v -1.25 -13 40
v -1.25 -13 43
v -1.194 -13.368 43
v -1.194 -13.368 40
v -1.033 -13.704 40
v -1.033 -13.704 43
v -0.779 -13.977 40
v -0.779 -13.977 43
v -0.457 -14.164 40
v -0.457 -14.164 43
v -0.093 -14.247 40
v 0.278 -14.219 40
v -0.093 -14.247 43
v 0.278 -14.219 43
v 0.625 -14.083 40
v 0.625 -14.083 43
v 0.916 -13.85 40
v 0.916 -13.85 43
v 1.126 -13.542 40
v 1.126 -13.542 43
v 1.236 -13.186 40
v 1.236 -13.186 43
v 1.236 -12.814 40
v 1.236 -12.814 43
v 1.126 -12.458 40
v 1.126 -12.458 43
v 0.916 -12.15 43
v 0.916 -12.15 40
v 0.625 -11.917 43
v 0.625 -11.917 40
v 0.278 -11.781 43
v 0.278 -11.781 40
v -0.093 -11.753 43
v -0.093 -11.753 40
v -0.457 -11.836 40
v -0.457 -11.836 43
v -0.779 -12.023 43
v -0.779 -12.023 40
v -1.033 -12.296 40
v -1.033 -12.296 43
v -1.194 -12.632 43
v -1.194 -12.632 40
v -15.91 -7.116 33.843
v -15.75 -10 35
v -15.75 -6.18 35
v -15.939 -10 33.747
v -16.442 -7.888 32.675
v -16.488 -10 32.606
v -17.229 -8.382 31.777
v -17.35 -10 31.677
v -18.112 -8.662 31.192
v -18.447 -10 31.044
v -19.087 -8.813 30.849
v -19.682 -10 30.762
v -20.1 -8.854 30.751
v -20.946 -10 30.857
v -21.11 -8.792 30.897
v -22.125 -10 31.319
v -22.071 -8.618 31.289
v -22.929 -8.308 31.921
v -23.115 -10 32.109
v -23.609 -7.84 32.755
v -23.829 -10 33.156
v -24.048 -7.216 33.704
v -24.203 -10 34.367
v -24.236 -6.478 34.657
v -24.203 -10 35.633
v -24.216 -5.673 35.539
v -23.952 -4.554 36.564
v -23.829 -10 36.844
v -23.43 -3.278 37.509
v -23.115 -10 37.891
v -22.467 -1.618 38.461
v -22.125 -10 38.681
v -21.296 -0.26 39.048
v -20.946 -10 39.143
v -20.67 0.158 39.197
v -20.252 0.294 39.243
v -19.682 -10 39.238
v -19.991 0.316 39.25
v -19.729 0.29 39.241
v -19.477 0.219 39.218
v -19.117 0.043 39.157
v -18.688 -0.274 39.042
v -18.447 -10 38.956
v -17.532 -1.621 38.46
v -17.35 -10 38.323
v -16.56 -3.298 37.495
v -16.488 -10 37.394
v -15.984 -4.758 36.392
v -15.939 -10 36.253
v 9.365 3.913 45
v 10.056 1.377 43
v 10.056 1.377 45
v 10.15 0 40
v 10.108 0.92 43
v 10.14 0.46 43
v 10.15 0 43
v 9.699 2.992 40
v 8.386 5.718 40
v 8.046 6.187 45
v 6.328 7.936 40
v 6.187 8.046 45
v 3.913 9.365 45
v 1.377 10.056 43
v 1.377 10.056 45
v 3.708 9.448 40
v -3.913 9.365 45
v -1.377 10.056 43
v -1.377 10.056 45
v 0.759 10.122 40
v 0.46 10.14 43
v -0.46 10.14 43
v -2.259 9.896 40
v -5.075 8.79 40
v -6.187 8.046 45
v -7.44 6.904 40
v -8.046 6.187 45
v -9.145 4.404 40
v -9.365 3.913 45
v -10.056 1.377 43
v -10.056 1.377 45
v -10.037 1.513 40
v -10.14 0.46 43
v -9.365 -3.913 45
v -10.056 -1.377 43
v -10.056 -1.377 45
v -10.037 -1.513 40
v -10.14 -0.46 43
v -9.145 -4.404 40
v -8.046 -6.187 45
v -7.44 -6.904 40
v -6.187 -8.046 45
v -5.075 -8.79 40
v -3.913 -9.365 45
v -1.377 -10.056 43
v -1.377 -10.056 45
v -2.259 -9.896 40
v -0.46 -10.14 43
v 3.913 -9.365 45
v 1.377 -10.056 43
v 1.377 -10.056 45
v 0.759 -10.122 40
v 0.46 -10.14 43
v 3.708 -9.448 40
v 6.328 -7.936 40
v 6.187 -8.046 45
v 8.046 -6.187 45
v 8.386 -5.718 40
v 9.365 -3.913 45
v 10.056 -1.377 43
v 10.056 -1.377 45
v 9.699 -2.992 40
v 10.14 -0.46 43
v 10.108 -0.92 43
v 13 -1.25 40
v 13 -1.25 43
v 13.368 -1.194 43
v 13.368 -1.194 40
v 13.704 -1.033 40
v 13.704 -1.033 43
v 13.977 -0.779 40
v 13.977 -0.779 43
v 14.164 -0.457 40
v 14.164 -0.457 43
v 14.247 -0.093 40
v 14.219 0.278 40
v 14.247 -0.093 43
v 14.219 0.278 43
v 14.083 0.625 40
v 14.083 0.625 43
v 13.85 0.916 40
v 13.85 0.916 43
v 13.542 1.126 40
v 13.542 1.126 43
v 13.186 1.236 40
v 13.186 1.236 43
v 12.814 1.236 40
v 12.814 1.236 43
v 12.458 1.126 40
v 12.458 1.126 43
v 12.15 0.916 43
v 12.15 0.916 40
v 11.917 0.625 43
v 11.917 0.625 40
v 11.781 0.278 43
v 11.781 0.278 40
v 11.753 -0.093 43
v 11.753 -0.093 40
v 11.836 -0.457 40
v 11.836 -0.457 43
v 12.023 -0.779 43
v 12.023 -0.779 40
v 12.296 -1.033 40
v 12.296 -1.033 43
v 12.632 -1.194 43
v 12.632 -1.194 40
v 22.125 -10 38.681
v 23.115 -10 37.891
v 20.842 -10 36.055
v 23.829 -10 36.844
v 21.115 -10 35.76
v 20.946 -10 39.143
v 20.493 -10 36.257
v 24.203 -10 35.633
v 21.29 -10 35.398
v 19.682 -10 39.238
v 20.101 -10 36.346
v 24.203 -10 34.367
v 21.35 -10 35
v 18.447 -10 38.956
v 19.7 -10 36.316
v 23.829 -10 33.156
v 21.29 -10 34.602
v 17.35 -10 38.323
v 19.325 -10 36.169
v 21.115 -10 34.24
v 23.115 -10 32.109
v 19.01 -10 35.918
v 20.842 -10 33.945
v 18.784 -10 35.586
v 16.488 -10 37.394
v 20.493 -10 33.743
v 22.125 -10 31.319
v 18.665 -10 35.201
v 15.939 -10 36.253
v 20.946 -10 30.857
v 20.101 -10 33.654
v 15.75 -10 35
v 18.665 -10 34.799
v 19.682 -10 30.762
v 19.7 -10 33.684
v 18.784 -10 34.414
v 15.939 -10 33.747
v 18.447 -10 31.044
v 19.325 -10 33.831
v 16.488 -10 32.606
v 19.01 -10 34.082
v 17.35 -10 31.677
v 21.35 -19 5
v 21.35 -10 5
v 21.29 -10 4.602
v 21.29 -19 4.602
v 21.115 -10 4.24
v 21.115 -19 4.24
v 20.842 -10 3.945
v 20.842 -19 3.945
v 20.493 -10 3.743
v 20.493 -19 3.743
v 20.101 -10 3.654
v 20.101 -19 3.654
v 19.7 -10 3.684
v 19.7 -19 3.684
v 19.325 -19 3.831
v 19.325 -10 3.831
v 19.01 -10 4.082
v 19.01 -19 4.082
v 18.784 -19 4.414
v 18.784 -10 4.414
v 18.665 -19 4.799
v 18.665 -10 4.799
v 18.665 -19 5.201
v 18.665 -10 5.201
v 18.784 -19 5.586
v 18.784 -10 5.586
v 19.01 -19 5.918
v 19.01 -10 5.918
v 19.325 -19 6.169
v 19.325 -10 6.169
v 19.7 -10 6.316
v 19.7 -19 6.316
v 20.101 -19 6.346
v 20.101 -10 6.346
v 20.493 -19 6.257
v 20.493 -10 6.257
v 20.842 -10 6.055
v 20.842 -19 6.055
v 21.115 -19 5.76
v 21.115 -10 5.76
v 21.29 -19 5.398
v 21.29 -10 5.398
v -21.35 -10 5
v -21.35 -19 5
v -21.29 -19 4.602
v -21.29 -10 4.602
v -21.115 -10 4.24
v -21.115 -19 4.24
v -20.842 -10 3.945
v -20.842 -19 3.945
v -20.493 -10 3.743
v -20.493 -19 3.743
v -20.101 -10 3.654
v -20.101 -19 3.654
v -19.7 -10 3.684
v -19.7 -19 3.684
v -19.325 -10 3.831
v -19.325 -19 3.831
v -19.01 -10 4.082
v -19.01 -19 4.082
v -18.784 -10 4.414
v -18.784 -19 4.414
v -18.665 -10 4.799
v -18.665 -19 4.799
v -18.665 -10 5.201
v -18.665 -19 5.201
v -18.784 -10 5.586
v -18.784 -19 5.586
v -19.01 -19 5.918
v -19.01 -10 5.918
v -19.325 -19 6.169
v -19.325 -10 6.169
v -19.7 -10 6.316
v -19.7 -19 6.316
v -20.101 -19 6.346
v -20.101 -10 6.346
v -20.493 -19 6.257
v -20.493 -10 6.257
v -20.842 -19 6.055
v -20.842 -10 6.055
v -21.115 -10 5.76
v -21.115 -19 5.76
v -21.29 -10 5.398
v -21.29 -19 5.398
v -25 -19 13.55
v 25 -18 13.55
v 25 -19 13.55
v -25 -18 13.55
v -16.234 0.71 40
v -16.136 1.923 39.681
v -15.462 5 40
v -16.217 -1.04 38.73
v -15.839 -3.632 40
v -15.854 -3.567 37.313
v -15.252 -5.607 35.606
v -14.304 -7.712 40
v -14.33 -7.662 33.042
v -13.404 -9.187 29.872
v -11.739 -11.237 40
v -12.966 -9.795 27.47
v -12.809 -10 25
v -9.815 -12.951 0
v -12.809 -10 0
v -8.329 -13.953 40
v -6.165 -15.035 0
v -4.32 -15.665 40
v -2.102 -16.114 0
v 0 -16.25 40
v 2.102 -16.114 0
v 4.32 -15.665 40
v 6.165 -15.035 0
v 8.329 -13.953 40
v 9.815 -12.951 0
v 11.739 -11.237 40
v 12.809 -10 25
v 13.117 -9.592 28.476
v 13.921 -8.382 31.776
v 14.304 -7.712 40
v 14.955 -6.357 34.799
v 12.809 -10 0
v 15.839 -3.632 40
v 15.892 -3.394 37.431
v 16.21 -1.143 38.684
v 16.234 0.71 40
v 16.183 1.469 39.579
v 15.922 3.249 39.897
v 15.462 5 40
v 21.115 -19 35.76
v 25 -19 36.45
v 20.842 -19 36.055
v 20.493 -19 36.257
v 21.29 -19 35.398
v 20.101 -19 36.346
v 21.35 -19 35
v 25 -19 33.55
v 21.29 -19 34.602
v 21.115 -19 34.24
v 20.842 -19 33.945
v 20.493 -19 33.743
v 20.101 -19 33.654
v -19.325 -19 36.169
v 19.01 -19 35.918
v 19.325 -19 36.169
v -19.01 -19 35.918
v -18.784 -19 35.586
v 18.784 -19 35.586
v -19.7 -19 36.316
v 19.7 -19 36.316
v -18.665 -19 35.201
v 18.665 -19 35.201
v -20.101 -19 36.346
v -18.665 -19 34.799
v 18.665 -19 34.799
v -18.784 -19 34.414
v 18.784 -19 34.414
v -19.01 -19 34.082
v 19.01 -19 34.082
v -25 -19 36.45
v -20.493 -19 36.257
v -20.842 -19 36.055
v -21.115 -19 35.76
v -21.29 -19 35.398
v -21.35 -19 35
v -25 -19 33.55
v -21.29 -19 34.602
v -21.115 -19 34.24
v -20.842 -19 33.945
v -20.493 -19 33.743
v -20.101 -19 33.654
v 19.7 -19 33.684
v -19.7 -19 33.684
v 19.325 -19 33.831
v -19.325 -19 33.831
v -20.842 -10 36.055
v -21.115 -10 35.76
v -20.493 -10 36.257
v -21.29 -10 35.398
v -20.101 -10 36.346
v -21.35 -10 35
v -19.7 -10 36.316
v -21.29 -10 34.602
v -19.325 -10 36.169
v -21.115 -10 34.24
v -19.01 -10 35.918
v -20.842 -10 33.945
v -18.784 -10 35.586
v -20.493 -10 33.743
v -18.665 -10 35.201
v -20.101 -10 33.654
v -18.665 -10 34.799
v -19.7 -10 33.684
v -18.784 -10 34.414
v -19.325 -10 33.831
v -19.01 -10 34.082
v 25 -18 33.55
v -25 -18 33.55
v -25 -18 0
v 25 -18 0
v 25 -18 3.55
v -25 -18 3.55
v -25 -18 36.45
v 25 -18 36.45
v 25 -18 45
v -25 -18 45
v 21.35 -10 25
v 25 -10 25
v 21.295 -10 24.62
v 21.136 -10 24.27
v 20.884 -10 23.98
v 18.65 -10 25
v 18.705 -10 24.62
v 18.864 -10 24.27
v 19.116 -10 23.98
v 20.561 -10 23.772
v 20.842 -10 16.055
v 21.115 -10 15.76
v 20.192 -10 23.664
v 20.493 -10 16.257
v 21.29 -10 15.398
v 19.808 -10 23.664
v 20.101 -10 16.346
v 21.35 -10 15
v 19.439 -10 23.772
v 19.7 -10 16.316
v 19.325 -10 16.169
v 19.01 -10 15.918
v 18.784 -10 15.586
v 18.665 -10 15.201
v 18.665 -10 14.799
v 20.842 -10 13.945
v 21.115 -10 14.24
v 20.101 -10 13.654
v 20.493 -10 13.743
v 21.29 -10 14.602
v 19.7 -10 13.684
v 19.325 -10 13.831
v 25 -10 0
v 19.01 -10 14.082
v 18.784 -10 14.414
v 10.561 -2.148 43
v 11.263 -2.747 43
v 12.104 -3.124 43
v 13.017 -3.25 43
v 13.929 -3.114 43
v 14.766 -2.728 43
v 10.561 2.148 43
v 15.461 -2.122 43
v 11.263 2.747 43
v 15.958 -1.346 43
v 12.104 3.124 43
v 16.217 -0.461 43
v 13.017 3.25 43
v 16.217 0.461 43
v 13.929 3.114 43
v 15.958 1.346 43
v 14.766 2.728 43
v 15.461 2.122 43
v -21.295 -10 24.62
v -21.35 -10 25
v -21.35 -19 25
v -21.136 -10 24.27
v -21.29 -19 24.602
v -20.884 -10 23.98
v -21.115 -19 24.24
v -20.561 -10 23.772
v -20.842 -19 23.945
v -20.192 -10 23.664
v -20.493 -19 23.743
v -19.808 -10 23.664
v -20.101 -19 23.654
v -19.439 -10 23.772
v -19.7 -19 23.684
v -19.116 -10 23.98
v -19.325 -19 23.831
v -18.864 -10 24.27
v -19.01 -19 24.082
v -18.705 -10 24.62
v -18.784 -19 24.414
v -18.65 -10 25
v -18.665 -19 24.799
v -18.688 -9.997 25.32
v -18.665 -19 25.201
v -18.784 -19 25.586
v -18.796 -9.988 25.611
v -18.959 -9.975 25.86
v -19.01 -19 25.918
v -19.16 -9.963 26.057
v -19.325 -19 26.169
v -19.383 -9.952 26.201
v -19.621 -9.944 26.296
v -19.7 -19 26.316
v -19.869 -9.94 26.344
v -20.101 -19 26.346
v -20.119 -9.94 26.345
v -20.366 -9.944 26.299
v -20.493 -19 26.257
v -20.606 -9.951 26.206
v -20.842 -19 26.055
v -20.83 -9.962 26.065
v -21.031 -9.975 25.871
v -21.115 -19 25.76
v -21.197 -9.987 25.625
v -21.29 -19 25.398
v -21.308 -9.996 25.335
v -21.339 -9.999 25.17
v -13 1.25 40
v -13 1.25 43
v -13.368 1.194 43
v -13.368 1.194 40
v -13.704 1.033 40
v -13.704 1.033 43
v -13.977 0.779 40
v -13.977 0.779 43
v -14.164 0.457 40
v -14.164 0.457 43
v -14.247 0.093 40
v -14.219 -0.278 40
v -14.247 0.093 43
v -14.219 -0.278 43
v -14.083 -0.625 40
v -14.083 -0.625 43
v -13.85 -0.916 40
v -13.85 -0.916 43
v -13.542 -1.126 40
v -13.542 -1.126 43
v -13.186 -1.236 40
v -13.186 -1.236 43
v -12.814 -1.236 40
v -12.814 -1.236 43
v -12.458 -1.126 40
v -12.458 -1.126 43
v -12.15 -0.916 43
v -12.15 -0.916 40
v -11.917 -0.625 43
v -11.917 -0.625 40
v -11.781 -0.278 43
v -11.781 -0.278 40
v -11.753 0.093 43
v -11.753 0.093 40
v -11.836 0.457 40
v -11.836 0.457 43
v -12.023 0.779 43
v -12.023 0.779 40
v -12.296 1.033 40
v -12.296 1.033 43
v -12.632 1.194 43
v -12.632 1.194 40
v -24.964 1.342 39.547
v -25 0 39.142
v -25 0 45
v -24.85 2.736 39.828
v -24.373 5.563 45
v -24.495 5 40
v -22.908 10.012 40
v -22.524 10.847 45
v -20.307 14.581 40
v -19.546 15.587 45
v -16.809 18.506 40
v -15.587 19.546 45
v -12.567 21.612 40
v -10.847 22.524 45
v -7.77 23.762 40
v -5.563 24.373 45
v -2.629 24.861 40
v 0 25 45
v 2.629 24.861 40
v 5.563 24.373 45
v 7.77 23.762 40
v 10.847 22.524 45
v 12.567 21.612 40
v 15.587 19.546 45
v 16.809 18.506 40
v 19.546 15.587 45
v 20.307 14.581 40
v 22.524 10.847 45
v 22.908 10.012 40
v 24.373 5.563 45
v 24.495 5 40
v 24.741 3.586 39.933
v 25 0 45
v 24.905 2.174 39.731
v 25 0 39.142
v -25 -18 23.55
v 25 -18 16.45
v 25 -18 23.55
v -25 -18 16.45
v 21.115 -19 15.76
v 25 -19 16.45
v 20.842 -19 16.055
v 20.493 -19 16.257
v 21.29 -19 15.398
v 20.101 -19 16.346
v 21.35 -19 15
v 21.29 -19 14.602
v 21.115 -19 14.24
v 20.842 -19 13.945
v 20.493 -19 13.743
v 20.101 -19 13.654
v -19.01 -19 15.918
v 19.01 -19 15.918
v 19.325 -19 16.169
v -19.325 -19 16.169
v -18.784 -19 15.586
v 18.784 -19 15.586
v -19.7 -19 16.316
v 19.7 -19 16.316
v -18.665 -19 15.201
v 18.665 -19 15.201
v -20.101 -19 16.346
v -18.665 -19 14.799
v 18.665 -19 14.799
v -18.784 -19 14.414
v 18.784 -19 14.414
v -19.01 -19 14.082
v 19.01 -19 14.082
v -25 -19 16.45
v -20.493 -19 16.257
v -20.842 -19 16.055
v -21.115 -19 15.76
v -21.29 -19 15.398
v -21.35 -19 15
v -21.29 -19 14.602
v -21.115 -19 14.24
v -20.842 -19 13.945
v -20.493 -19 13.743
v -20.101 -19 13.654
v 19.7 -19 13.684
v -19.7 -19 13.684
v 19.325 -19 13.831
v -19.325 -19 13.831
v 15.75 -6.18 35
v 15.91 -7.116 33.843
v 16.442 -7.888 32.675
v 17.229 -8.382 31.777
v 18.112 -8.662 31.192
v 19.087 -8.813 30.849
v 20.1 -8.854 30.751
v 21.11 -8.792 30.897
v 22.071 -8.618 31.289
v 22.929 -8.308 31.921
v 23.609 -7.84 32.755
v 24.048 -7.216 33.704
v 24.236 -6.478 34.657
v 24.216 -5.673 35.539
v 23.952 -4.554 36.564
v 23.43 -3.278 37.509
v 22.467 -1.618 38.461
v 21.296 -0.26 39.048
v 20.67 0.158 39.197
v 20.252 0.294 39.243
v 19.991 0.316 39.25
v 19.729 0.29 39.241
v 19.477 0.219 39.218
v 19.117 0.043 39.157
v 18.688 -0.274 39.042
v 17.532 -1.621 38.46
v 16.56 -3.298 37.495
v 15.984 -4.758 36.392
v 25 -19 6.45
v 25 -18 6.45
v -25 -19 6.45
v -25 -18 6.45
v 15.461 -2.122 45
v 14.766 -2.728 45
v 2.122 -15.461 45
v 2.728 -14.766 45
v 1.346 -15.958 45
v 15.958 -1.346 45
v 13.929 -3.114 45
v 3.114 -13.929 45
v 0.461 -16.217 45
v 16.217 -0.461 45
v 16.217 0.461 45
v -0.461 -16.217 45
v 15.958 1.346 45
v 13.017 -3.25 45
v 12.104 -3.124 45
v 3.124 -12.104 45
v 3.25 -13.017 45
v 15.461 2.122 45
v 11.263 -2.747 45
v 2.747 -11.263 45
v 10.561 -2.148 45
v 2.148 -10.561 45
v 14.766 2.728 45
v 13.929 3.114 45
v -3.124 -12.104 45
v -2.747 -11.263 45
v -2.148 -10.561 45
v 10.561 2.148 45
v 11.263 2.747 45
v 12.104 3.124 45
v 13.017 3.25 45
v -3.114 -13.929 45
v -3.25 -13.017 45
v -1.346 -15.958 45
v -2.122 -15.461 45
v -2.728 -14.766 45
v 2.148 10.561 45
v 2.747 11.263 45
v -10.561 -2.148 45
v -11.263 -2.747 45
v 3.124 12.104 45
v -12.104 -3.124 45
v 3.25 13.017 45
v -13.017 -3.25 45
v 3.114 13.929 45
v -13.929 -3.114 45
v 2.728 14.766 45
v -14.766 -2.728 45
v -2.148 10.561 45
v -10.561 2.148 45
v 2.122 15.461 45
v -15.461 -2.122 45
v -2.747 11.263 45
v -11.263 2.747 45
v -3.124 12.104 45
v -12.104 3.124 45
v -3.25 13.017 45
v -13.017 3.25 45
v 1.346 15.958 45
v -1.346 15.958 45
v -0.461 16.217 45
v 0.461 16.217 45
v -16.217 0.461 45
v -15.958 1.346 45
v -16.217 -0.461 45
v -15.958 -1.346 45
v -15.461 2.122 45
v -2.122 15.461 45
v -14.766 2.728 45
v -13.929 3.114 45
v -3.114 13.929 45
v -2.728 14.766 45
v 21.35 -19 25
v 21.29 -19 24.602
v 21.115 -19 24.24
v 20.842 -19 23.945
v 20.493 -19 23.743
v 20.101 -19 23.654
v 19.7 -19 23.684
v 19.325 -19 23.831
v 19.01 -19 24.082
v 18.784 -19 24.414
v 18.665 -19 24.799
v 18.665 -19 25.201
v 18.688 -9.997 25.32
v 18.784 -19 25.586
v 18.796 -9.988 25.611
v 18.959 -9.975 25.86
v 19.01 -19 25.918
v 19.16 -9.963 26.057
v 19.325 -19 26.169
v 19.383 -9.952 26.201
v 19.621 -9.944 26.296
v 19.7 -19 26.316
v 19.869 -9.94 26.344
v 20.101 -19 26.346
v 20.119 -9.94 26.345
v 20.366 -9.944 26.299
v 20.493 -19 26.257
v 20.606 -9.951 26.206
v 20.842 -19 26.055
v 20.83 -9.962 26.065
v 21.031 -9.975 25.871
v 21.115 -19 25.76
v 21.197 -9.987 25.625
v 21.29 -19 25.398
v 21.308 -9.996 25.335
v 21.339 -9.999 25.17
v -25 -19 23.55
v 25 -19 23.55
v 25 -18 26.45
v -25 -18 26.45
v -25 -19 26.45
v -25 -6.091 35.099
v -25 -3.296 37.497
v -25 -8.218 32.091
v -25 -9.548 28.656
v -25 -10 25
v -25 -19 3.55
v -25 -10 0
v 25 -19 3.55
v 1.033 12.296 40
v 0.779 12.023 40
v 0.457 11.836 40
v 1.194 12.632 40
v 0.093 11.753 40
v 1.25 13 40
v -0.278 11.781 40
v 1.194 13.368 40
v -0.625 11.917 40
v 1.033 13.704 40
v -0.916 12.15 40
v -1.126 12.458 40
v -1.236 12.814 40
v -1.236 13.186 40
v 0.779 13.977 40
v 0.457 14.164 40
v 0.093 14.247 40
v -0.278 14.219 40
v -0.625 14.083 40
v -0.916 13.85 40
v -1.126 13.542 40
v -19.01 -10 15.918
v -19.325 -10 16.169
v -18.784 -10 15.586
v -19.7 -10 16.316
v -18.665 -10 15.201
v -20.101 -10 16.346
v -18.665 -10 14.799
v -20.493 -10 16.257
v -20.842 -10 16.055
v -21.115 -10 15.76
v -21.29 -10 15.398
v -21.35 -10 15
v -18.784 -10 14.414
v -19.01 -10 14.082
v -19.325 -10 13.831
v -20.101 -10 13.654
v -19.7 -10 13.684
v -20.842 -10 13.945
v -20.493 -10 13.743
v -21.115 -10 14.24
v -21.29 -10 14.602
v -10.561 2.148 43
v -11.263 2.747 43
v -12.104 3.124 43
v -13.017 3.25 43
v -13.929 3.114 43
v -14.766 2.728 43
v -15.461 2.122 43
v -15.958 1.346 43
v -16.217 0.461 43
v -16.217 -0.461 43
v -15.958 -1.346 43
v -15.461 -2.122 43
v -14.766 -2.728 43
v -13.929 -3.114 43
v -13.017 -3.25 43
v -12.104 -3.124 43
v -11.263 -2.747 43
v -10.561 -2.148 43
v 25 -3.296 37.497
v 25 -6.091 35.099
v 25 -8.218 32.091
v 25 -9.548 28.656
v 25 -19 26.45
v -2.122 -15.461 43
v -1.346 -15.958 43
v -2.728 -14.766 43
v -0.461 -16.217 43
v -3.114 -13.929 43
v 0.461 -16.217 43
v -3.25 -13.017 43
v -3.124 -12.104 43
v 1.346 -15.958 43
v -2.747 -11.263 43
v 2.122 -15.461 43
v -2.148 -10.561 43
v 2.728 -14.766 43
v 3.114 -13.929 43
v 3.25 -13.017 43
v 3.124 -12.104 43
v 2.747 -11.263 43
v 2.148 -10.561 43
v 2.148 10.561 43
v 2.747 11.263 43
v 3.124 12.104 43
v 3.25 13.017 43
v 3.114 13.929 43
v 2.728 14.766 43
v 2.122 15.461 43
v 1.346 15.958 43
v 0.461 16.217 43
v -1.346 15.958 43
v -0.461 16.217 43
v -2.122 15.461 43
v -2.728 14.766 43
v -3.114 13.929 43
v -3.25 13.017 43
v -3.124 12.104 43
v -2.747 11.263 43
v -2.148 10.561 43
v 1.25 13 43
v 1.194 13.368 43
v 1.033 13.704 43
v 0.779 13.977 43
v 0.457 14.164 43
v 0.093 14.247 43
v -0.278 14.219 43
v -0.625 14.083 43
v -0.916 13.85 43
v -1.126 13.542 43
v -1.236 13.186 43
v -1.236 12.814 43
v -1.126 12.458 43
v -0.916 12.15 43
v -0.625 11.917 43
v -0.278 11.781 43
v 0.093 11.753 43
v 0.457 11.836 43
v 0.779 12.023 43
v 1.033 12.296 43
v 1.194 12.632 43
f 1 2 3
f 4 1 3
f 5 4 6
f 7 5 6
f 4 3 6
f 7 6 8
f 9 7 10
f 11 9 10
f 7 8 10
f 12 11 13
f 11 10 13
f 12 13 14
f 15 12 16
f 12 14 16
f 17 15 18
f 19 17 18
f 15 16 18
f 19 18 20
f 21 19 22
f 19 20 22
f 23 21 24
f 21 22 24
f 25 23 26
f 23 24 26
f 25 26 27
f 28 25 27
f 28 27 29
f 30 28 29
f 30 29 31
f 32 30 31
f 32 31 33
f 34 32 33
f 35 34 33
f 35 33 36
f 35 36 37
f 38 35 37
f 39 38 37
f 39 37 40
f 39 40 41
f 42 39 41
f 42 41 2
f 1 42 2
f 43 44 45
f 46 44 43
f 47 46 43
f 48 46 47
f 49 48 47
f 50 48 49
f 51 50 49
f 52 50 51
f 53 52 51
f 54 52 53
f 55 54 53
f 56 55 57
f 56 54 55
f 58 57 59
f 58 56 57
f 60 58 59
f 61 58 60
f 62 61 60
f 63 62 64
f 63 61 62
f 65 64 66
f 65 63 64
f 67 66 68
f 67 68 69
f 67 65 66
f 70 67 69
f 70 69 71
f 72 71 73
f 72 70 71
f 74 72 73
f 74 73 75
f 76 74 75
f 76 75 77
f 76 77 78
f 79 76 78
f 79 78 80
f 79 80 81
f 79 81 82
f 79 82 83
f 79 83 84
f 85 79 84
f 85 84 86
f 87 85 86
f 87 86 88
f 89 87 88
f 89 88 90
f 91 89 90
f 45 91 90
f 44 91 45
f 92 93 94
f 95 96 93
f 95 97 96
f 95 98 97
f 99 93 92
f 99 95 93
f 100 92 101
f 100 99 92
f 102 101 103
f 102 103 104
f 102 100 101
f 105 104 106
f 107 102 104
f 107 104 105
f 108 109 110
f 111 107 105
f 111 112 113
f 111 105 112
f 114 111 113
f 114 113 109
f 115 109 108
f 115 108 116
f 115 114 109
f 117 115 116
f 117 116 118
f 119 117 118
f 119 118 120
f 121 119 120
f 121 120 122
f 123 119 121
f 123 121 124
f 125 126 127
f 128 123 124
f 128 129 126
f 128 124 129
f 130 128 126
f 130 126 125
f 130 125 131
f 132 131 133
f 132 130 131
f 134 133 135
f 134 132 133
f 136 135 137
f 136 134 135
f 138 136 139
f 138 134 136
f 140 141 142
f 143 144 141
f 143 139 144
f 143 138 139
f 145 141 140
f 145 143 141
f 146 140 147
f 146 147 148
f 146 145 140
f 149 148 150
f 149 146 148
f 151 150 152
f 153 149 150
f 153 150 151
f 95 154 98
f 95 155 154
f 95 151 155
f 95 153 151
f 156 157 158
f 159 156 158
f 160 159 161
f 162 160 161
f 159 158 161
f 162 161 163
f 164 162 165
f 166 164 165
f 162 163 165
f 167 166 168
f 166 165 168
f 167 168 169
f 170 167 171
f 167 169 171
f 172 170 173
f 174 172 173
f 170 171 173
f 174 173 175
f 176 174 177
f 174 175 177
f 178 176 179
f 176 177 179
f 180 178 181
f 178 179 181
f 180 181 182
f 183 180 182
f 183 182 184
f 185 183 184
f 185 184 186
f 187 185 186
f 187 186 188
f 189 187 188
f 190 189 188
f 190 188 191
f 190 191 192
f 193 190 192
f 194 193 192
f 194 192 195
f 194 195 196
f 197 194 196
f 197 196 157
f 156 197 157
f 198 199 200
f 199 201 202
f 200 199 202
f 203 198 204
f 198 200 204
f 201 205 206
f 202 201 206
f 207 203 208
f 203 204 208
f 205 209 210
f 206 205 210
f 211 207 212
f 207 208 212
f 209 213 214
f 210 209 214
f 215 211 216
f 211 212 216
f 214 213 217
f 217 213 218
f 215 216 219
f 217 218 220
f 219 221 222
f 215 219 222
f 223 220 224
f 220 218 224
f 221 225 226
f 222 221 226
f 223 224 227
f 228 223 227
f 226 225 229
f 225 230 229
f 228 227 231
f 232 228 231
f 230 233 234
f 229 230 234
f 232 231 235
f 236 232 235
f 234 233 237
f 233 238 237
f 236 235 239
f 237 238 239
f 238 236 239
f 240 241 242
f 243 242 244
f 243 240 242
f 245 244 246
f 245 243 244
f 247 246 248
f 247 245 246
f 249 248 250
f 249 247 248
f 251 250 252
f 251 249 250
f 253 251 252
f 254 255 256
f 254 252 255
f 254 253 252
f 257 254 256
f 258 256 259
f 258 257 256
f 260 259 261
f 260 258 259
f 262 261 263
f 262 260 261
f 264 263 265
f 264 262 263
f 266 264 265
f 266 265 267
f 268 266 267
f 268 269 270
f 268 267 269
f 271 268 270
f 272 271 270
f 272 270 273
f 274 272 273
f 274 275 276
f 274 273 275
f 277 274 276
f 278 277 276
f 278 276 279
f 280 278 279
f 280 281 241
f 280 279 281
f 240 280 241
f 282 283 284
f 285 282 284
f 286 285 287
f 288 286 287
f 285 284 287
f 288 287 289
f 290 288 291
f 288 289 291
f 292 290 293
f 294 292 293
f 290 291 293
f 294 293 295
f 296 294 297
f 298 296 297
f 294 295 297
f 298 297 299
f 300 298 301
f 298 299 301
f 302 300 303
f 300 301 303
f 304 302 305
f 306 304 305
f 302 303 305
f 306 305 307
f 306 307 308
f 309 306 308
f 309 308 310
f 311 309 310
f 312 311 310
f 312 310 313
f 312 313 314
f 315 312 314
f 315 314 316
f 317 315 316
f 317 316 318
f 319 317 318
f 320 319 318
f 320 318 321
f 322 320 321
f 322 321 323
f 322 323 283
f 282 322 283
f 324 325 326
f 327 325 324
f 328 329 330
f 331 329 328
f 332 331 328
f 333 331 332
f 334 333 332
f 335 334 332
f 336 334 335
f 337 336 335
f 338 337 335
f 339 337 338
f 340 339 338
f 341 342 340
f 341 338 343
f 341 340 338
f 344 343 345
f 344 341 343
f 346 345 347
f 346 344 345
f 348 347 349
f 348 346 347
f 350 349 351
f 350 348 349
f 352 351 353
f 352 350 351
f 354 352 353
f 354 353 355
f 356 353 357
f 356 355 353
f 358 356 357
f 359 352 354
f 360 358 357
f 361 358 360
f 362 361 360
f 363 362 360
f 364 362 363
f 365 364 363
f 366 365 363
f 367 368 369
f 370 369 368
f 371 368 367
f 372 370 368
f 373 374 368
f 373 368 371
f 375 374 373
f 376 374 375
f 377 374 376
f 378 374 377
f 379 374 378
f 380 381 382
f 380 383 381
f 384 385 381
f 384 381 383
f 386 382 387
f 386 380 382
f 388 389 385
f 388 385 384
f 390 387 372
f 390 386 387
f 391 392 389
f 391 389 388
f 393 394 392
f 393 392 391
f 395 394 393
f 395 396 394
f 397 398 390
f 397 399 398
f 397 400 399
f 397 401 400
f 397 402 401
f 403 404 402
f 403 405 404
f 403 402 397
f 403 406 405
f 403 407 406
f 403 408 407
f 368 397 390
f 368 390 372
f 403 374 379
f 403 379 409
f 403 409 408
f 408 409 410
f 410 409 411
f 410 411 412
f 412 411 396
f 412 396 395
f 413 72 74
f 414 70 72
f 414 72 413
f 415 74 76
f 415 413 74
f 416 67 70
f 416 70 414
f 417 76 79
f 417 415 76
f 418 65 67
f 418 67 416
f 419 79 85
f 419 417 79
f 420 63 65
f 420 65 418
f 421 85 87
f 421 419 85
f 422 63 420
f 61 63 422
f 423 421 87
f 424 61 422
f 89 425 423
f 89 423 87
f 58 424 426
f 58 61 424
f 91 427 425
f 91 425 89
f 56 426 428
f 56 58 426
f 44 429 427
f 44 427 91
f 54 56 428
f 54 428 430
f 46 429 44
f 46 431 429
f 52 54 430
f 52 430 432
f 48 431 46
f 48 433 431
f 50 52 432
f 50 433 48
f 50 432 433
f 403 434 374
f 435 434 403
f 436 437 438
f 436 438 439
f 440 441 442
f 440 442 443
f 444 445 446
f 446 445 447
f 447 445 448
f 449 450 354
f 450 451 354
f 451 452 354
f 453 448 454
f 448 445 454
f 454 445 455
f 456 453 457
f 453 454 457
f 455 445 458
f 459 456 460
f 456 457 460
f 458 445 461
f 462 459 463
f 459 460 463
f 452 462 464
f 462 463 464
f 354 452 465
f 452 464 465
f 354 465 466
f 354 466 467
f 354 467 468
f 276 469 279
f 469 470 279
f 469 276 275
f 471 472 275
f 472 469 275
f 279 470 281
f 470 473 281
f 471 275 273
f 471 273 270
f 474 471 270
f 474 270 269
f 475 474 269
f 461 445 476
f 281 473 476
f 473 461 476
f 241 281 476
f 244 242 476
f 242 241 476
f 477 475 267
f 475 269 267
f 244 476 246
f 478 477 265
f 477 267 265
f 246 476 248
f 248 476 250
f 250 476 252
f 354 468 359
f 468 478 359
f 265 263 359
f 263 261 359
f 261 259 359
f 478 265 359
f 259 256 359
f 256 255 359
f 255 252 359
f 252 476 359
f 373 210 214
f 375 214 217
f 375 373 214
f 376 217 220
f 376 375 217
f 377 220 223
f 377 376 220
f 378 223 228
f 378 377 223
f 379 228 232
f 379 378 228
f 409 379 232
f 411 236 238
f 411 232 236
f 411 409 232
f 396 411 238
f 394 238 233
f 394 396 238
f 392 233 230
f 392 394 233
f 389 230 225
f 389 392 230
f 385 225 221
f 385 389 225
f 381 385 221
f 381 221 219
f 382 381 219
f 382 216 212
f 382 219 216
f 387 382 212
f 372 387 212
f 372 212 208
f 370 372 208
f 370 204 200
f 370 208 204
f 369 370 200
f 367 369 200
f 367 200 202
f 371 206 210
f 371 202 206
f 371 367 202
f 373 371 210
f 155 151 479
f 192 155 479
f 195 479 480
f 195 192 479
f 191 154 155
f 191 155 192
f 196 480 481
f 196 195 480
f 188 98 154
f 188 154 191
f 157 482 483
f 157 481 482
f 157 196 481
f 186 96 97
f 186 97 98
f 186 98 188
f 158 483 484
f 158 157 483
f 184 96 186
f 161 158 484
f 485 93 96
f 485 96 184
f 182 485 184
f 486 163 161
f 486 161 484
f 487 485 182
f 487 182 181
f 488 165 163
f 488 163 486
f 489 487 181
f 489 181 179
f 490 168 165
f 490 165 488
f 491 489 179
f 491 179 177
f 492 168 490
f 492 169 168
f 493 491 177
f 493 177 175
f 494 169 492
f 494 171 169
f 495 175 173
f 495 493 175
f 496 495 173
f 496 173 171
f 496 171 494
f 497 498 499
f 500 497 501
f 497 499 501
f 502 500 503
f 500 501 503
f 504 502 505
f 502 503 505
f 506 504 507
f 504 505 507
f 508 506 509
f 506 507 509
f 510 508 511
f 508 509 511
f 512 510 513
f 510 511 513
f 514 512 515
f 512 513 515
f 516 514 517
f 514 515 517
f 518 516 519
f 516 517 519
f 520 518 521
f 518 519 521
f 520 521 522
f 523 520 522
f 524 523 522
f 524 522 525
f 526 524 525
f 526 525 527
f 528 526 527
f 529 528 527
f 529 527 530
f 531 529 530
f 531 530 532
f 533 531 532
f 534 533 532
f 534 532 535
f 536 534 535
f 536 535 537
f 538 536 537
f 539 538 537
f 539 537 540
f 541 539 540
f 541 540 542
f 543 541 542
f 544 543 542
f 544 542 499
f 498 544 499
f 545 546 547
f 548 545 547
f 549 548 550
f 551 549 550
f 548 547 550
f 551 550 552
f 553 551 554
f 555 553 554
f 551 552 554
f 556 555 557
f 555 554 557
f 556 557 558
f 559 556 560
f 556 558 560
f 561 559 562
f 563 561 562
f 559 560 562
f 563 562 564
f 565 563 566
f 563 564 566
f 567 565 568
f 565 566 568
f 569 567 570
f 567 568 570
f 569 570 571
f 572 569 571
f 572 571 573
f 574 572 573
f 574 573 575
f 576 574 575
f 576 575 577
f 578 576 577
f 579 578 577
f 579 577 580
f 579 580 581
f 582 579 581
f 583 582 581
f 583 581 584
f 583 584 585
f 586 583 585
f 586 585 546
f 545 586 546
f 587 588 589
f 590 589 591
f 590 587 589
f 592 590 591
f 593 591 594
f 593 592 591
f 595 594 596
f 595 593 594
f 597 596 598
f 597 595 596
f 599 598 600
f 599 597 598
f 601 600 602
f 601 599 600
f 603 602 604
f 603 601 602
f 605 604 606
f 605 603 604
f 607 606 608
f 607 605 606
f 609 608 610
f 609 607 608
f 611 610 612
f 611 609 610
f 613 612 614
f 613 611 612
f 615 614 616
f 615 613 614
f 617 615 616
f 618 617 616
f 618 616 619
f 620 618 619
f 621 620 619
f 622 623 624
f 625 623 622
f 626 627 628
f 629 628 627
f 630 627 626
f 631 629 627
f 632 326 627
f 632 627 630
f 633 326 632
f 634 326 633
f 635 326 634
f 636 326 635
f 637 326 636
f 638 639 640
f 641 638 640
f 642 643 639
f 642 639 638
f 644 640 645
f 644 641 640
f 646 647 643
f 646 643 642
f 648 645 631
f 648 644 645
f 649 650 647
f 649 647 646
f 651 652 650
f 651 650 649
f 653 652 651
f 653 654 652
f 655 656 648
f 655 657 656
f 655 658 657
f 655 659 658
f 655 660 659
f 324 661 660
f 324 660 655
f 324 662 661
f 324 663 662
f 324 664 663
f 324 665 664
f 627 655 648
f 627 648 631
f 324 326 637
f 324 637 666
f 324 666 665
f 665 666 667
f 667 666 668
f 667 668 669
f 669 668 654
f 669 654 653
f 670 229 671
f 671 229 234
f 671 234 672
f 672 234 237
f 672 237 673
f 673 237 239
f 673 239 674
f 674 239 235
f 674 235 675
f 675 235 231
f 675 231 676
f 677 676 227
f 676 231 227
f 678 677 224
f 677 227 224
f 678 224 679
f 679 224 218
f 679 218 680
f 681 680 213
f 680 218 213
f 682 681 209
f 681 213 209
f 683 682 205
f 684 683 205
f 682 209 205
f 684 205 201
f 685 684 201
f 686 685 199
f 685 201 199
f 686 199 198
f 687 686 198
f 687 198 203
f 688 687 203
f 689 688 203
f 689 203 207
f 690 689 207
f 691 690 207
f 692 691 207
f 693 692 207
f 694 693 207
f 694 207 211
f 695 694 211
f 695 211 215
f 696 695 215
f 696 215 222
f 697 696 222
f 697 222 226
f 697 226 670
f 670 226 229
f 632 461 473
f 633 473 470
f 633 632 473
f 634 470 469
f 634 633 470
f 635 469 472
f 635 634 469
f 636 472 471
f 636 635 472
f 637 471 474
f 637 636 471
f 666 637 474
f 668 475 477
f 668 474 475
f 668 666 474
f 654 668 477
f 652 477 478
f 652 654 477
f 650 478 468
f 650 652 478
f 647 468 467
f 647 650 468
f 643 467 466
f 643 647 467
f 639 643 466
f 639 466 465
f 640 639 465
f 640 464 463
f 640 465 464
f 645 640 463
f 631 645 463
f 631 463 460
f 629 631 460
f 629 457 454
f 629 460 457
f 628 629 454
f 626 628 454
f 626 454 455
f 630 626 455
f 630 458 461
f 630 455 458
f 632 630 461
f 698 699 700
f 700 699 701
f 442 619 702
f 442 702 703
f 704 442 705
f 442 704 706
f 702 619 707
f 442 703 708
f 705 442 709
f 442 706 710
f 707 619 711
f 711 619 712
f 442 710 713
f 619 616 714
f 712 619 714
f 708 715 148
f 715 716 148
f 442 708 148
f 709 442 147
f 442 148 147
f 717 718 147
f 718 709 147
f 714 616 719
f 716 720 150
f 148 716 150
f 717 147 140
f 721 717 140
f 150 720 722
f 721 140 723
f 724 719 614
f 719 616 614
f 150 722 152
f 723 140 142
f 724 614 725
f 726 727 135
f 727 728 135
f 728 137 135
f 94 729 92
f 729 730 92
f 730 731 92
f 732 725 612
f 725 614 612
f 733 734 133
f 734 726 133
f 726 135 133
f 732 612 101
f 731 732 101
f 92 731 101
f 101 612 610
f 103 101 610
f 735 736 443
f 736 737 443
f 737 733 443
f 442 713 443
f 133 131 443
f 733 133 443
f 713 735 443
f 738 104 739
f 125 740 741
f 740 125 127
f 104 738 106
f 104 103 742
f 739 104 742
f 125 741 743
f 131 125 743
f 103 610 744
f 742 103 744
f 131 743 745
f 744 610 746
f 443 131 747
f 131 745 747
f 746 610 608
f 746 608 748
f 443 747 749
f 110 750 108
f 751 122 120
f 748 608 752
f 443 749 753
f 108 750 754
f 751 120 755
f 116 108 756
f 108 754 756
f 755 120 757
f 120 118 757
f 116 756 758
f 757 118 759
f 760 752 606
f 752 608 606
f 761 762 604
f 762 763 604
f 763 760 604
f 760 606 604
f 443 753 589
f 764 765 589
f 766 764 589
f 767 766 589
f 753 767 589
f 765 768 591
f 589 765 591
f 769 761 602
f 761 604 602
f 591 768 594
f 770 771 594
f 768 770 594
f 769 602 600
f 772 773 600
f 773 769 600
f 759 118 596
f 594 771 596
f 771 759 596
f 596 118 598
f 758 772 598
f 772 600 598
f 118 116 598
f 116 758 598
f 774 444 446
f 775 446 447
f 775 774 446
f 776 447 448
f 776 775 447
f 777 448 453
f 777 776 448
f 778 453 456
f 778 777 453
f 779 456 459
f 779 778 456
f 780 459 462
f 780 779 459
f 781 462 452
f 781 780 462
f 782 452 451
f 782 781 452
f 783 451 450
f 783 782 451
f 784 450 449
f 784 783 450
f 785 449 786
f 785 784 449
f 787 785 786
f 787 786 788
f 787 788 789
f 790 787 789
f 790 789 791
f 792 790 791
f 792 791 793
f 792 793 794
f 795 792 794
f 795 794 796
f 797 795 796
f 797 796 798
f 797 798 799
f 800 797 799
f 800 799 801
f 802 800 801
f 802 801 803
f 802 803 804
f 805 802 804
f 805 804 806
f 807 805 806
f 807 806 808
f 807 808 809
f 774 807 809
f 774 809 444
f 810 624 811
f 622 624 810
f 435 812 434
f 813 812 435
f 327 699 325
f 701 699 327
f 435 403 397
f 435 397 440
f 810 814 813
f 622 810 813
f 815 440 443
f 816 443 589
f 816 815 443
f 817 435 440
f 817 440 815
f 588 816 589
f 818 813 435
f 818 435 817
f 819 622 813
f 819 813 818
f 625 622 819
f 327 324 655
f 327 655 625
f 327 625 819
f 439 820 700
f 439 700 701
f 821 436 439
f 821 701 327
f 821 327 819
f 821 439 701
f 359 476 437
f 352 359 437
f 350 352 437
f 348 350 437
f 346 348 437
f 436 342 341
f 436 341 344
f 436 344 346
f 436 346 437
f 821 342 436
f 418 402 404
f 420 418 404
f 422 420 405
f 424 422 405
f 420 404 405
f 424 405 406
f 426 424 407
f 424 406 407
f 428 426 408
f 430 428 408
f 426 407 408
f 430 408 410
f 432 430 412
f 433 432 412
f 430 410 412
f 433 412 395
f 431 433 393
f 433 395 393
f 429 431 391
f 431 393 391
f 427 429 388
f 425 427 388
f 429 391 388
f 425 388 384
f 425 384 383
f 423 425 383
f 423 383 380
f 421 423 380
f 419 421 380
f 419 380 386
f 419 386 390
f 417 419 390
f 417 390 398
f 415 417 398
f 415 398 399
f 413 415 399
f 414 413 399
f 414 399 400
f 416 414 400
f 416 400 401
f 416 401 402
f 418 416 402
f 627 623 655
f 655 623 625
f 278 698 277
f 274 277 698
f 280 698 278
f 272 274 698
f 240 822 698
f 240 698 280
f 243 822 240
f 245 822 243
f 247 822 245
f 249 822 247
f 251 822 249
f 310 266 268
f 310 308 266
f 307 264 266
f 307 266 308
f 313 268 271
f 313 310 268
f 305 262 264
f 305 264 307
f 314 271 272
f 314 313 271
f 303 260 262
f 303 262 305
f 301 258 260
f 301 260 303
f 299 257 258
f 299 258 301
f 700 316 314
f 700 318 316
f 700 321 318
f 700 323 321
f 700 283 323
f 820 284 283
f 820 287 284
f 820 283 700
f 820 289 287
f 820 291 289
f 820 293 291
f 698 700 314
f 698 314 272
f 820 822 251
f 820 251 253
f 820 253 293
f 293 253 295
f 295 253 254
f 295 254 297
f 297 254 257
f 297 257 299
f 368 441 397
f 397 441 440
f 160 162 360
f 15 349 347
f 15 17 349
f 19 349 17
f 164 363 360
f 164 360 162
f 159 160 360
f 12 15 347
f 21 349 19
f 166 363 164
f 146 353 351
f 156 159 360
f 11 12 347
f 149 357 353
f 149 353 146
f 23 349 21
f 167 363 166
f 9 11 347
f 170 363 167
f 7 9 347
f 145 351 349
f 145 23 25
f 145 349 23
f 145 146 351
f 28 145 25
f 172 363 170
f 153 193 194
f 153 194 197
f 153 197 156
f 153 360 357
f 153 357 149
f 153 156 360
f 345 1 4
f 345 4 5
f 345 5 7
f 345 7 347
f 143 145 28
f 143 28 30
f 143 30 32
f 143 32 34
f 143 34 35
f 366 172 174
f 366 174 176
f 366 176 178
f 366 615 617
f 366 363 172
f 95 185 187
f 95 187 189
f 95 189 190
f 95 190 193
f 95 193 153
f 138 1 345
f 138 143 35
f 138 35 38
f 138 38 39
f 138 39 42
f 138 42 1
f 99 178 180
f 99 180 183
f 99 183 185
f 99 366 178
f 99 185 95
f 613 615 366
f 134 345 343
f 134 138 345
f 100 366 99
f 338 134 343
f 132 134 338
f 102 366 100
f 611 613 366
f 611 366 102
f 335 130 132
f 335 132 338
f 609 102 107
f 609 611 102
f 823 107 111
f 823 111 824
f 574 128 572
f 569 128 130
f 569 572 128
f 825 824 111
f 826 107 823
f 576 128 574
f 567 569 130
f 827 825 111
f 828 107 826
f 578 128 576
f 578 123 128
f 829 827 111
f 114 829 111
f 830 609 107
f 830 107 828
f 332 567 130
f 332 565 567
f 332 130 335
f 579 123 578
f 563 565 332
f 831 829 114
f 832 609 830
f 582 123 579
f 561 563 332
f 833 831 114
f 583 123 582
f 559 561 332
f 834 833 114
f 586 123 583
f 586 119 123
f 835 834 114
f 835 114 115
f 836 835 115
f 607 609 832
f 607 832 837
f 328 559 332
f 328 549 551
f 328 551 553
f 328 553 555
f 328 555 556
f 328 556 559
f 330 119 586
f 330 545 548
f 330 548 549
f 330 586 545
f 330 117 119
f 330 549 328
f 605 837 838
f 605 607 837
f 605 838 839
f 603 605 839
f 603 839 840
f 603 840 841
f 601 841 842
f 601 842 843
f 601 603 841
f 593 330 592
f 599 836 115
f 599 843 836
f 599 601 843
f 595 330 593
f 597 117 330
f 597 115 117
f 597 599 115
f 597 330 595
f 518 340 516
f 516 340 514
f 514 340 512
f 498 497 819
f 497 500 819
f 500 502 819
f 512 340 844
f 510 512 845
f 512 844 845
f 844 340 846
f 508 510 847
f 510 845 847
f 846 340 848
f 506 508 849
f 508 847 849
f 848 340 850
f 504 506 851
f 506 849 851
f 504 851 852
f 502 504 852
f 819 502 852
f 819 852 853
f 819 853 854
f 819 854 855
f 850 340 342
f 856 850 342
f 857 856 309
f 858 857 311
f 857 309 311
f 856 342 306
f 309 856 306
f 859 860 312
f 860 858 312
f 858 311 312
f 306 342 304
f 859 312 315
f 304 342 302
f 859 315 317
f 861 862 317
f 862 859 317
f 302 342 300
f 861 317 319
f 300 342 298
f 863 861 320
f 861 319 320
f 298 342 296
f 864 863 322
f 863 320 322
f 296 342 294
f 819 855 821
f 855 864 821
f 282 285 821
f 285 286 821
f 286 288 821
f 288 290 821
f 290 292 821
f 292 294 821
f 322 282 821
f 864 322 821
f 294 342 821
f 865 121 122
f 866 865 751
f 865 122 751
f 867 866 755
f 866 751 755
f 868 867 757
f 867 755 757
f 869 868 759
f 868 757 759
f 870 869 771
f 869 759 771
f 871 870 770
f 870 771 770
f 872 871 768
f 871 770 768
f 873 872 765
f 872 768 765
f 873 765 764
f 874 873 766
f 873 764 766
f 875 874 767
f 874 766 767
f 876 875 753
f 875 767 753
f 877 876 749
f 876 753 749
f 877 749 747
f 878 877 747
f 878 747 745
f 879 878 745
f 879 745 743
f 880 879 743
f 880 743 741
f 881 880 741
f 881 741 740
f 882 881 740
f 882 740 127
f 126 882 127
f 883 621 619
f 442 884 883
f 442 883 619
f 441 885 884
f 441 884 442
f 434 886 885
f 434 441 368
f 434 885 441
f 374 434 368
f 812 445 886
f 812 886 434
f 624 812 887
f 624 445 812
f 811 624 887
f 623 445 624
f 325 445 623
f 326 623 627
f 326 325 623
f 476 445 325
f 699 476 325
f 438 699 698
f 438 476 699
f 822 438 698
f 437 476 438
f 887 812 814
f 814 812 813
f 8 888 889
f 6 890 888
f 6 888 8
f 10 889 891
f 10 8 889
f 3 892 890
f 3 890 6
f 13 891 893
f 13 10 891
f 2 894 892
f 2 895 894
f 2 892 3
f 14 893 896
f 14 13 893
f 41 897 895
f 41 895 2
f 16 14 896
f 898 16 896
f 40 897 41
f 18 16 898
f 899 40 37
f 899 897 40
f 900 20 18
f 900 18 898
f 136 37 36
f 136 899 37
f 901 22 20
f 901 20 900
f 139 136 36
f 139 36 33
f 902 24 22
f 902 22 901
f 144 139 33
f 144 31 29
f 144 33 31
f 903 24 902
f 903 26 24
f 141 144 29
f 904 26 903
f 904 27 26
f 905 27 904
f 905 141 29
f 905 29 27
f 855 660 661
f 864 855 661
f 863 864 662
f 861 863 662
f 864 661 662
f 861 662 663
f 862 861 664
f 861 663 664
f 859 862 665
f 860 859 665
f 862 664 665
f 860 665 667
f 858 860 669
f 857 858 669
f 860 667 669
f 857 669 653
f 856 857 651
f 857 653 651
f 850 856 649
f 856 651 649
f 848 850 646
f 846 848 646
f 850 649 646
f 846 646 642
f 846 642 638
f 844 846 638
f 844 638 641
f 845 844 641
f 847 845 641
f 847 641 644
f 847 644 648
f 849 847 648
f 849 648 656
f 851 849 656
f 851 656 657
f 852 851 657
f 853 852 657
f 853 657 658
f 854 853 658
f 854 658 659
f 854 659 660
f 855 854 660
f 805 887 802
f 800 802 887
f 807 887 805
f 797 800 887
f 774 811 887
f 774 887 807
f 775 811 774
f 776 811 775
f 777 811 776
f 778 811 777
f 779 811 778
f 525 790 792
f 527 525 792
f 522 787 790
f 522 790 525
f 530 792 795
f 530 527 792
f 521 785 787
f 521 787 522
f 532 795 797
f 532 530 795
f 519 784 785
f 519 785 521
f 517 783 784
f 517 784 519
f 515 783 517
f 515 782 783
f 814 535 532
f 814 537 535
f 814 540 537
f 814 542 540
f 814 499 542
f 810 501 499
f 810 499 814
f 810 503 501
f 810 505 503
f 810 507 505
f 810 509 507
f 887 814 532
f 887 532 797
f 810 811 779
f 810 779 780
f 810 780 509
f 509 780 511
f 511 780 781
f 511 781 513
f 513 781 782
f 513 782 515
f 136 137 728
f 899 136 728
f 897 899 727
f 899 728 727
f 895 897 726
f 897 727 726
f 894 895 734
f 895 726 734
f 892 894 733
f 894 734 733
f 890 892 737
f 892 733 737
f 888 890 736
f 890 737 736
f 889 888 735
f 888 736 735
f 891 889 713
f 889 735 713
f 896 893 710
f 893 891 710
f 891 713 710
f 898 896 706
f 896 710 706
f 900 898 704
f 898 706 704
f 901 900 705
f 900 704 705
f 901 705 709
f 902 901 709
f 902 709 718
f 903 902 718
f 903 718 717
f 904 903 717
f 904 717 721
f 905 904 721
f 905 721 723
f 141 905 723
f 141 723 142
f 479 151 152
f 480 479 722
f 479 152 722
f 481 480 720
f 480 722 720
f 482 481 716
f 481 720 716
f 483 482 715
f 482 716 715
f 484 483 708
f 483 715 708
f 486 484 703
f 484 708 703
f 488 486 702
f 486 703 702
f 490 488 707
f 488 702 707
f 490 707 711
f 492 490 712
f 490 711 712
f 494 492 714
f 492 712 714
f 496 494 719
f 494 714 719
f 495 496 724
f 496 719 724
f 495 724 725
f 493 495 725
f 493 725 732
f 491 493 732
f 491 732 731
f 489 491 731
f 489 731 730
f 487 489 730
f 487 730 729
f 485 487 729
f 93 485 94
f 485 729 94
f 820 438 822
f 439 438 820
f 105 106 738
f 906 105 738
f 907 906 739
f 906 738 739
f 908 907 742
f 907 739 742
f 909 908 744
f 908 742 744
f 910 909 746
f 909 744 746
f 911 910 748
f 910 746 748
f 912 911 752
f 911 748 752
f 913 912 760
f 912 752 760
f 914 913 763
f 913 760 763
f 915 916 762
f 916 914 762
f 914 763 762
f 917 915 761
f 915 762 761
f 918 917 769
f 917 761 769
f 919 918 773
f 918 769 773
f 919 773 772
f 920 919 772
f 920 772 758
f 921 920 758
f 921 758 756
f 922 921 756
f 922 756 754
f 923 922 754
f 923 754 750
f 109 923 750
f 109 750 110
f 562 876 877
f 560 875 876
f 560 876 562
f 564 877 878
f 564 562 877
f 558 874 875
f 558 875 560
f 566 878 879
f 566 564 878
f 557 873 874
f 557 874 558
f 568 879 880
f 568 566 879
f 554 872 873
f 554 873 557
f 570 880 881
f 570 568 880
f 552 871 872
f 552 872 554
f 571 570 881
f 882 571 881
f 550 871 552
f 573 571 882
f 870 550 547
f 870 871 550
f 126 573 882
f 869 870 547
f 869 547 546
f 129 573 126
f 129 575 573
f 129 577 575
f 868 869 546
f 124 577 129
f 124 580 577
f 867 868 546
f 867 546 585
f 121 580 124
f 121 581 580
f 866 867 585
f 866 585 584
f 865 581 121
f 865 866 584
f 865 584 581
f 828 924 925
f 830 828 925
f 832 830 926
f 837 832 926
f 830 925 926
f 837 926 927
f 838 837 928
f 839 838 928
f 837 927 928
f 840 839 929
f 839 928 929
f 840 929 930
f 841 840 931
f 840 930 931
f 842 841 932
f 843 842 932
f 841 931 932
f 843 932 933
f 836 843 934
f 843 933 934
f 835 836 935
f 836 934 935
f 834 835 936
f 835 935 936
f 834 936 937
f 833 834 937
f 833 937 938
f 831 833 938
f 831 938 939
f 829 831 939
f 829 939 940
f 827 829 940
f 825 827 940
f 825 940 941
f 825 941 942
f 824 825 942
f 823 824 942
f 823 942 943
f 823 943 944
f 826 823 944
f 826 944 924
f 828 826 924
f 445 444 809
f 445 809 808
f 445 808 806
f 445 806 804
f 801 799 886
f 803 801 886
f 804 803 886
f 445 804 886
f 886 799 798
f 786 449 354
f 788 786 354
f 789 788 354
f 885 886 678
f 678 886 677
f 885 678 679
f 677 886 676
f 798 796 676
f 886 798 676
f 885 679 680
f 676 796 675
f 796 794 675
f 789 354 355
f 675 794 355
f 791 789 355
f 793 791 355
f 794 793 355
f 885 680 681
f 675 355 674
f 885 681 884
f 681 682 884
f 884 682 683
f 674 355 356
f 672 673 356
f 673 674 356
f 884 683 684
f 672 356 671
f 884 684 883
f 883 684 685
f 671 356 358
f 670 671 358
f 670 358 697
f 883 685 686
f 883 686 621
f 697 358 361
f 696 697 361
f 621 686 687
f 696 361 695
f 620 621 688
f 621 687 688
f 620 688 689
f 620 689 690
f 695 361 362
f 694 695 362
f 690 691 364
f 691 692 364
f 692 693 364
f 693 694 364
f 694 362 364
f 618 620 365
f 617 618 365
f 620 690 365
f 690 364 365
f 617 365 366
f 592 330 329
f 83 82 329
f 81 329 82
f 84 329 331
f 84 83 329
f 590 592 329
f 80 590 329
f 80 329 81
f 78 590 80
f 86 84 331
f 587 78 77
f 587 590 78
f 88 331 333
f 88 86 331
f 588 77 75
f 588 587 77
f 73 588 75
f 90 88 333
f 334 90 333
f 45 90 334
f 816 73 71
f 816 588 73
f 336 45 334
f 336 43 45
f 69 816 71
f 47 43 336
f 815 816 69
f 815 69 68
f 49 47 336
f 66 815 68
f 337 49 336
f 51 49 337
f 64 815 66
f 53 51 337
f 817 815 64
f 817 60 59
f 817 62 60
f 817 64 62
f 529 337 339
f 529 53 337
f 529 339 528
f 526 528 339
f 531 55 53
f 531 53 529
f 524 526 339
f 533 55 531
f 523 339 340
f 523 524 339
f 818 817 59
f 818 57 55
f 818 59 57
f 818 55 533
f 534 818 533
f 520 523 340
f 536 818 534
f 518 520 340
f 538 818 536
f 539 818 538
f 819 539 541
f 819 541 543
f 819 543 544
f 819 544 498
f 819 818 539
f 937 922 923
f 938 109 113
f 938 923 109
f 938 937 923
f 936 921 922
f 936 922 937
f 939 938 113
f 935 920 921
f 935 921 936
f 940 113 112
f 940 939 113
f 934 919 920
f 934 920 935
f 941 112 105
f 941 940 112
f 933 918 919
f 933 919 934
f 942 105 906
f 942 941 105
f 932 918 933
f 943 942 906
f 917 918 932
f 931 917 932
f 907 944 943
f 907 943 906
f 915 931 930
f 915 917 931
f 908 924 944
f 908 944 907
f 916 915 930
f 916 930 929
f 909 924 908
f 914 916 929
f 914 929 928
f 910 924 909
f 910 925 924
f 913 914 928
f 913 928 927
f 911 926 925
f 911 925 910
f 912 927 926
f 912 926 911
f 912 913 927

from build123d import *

# Parameters (mm, degrees)
SKETCH1_R                  = 10.15
MAIN_DEPTH                 = 45
SKETCH3_R                  = 16.25
MOTOREDUCTORMAINHOLE_DEPTH = 40
SKETCH2_R                  = 1.25
FIXHOLEMOTORS_DEPTH        = 10
HOLECIRCULARPATTERN_COUNT  = 4
SKETCH5_R                  = 3.25
HEADSCREWHOLE_DEPTH        = 2
SKETCH4_W                  = 50
SKETCH4_H                  = 35
HORIZONTALCUT_DEPTH        = 40
FILLET3_R                  = 15
SKETCH7_W                  = 50
SKETCH7_H                  = 2.9
MAKERBEAMRAIL_DEPTH        = 1
LPATTERN1_COUNT            = 4
LPATTERN1_PITCH            = 10
SKETCH6_R                  = 1.35
FIXTOPLATEHOLE_DEPTH       = 45.0000001
SKETCH9_R                  = 4.25
CUT_EXTRUDE2_DEPTH         = 36.0000001


with BuildPart() as part:
    # Sketch1 → Main (new body)
    with BuildSketch(Plane.XY):
        with BuildLine():
            Line((-25, -18), (-25, 0))
            ThreePointArc((-25, 0), (0, 25), (25, 0))
            Line((25, 0), (25, -18))
            Line((25, -18), (-25, -18))
        make_face()
        Circle(SKETCH1_R, mode=Mode.SUBTRACT)
    extrude(amount=MAIN_DEPTH)

    # Sketch3 → MotoReductorMainHole (cut)
    with BuildSketch(Plane.XY):
        Circle(SKETCH3_R)
    extrude(amount=MOTOREDUCTORMAINHOLE_DEPTH, mode=Mode.SUBTRACT)

    # Sketch2 → FixHoleMotors (cut)
    with BuildSketch(Plane.XY.offset(45)):
        with Locations((0, 13)):
            Circle(SKETCH2_R)
    fixholemotors = extrude(amount=-FIXHOLEMOTORS_DEPTH, mode=Mode.SUBTRACT)

    # HoleCircularPattern: FixHoleMotors ×4 about axis
    holecircularpattern_axis = Axis((0, 0, 0), (0, 0, 1))
    for i in range(1, HOLECIRCULARPATTERN_COUNT):
        add(fixholemotors.rotate(holecircularpattern_axis, i * 360 / HOLECIRCULARPATTERN_COUNT), mode=Mode.SUBTRACT)

    # Sketch5 → HeadScrewHole (cut)
    with BuildSketch(Plane.XY.offset(45)):
        with Locations((0, 13)):
            Circle(SKETCH5_R)
        with Locations((13, 0)):
            Circle(SKETCH5_R)
        with Locations((0, -13)):
            Circle(SKETCH5_R)
        with Locations((-13, 0)):
            Circle(SKETCH5_R)
    extrude(amount=-HEADSCREWHOLE_DEPTH, mode=Mode.SUBTRACT)

    # Sketch4 → HorizontalCut (cut)
    with BuildSketch(Plane(origin=(0, 0, 0), x_dir=(-1, 0, 0), z_dir=(0, 0, -1))):
        with Locations((0, 7.5)):
            Rectangle(SKETCH4_W, SKETCH4_H)
    extrude(amount=-HORIZONTALCUT_DEPTH, mode=Mode.SUBTRACT)

    # Fillet3
    fillet3_edges = [part.edges().sort_by_distance(p)[0] for p in [
        (-18.904344229, -10, 40),
        (18.904344229, -10, 40),
    ]]
    fillet(fillet3_edges, radius=FILLET3_R)

    # Sketch7 → MakerBeamRail (add)
    with BuildSketch(Plane(origin=(0, -18, 0), x_dir=(-1, 0, 0), z_dir=(0, -1, 0))):
        with Locations((0, -35)):
            Rectangle(SKETCH7_W, SKETCH7_H)
    makerbeamrail = extrude(amount=MAKERBEAMRAIL_DEPTH)

    # LPattern1: MakerBeamRail ×4
    with Locations(*[(0, 0, -i * LPATTERN1_PITCH) for i in range(1, LPATTERN1_COUNT)]):
        add(makerbeamrail)

    # Sketch6 → FixToPlateHole (cut, through all)
    with BuildSketch(Plane(origin=(0, -19, 0), x_dir=(-1, 0, 0), z_dir=(0, -1, 0))):
        with Locations((20, -35)):
            Circle(SKETCH6_R)
        with Locations((20, -15)):
            Circle(SKETCH6_R)
        with Locations((20, -25)):
            Circle(SKETCH6_R)
        with Locations((20, -5)):
            Circle(SKETCH6_R)
    fixtoplatehole = extrude(amount=-FIXTOPLATEHOLE_DEPTH, mode=Mode.SUBTRACT)

    # Sketch9 → Cut-Extrude2 (cut, through all)
    with BuildSketch(Plane(origin=(0, -10, 0), x_dir=(1, 0, 0), z_dir=(0, 1, 0))):
        with Locations((-20, -35)):
            Circle(SKETCH9_R)
    cut_extrude2 = extrude(amount=CUT_EXTRUDE2_DEPTH, mode=Mode.SUBTRACT)

    # Mirror1: FixToPlateHole, Cut-Extrude2 across plane
    add(fixtoplatehole.mirror(Plane(origin=(0, 0, 0), x_dir=(0, 0, 1), z_dir=(1, 0, 0))), mode=Mode.SUBTRACT)
    add(cut_extrude2.mirror(Plane(origin=(0, 0, 0), x_dir=(0, 0, 1), z_dir=(1, 0, 0))), mode=Mode.SUBTRACT)


solid = part.part
